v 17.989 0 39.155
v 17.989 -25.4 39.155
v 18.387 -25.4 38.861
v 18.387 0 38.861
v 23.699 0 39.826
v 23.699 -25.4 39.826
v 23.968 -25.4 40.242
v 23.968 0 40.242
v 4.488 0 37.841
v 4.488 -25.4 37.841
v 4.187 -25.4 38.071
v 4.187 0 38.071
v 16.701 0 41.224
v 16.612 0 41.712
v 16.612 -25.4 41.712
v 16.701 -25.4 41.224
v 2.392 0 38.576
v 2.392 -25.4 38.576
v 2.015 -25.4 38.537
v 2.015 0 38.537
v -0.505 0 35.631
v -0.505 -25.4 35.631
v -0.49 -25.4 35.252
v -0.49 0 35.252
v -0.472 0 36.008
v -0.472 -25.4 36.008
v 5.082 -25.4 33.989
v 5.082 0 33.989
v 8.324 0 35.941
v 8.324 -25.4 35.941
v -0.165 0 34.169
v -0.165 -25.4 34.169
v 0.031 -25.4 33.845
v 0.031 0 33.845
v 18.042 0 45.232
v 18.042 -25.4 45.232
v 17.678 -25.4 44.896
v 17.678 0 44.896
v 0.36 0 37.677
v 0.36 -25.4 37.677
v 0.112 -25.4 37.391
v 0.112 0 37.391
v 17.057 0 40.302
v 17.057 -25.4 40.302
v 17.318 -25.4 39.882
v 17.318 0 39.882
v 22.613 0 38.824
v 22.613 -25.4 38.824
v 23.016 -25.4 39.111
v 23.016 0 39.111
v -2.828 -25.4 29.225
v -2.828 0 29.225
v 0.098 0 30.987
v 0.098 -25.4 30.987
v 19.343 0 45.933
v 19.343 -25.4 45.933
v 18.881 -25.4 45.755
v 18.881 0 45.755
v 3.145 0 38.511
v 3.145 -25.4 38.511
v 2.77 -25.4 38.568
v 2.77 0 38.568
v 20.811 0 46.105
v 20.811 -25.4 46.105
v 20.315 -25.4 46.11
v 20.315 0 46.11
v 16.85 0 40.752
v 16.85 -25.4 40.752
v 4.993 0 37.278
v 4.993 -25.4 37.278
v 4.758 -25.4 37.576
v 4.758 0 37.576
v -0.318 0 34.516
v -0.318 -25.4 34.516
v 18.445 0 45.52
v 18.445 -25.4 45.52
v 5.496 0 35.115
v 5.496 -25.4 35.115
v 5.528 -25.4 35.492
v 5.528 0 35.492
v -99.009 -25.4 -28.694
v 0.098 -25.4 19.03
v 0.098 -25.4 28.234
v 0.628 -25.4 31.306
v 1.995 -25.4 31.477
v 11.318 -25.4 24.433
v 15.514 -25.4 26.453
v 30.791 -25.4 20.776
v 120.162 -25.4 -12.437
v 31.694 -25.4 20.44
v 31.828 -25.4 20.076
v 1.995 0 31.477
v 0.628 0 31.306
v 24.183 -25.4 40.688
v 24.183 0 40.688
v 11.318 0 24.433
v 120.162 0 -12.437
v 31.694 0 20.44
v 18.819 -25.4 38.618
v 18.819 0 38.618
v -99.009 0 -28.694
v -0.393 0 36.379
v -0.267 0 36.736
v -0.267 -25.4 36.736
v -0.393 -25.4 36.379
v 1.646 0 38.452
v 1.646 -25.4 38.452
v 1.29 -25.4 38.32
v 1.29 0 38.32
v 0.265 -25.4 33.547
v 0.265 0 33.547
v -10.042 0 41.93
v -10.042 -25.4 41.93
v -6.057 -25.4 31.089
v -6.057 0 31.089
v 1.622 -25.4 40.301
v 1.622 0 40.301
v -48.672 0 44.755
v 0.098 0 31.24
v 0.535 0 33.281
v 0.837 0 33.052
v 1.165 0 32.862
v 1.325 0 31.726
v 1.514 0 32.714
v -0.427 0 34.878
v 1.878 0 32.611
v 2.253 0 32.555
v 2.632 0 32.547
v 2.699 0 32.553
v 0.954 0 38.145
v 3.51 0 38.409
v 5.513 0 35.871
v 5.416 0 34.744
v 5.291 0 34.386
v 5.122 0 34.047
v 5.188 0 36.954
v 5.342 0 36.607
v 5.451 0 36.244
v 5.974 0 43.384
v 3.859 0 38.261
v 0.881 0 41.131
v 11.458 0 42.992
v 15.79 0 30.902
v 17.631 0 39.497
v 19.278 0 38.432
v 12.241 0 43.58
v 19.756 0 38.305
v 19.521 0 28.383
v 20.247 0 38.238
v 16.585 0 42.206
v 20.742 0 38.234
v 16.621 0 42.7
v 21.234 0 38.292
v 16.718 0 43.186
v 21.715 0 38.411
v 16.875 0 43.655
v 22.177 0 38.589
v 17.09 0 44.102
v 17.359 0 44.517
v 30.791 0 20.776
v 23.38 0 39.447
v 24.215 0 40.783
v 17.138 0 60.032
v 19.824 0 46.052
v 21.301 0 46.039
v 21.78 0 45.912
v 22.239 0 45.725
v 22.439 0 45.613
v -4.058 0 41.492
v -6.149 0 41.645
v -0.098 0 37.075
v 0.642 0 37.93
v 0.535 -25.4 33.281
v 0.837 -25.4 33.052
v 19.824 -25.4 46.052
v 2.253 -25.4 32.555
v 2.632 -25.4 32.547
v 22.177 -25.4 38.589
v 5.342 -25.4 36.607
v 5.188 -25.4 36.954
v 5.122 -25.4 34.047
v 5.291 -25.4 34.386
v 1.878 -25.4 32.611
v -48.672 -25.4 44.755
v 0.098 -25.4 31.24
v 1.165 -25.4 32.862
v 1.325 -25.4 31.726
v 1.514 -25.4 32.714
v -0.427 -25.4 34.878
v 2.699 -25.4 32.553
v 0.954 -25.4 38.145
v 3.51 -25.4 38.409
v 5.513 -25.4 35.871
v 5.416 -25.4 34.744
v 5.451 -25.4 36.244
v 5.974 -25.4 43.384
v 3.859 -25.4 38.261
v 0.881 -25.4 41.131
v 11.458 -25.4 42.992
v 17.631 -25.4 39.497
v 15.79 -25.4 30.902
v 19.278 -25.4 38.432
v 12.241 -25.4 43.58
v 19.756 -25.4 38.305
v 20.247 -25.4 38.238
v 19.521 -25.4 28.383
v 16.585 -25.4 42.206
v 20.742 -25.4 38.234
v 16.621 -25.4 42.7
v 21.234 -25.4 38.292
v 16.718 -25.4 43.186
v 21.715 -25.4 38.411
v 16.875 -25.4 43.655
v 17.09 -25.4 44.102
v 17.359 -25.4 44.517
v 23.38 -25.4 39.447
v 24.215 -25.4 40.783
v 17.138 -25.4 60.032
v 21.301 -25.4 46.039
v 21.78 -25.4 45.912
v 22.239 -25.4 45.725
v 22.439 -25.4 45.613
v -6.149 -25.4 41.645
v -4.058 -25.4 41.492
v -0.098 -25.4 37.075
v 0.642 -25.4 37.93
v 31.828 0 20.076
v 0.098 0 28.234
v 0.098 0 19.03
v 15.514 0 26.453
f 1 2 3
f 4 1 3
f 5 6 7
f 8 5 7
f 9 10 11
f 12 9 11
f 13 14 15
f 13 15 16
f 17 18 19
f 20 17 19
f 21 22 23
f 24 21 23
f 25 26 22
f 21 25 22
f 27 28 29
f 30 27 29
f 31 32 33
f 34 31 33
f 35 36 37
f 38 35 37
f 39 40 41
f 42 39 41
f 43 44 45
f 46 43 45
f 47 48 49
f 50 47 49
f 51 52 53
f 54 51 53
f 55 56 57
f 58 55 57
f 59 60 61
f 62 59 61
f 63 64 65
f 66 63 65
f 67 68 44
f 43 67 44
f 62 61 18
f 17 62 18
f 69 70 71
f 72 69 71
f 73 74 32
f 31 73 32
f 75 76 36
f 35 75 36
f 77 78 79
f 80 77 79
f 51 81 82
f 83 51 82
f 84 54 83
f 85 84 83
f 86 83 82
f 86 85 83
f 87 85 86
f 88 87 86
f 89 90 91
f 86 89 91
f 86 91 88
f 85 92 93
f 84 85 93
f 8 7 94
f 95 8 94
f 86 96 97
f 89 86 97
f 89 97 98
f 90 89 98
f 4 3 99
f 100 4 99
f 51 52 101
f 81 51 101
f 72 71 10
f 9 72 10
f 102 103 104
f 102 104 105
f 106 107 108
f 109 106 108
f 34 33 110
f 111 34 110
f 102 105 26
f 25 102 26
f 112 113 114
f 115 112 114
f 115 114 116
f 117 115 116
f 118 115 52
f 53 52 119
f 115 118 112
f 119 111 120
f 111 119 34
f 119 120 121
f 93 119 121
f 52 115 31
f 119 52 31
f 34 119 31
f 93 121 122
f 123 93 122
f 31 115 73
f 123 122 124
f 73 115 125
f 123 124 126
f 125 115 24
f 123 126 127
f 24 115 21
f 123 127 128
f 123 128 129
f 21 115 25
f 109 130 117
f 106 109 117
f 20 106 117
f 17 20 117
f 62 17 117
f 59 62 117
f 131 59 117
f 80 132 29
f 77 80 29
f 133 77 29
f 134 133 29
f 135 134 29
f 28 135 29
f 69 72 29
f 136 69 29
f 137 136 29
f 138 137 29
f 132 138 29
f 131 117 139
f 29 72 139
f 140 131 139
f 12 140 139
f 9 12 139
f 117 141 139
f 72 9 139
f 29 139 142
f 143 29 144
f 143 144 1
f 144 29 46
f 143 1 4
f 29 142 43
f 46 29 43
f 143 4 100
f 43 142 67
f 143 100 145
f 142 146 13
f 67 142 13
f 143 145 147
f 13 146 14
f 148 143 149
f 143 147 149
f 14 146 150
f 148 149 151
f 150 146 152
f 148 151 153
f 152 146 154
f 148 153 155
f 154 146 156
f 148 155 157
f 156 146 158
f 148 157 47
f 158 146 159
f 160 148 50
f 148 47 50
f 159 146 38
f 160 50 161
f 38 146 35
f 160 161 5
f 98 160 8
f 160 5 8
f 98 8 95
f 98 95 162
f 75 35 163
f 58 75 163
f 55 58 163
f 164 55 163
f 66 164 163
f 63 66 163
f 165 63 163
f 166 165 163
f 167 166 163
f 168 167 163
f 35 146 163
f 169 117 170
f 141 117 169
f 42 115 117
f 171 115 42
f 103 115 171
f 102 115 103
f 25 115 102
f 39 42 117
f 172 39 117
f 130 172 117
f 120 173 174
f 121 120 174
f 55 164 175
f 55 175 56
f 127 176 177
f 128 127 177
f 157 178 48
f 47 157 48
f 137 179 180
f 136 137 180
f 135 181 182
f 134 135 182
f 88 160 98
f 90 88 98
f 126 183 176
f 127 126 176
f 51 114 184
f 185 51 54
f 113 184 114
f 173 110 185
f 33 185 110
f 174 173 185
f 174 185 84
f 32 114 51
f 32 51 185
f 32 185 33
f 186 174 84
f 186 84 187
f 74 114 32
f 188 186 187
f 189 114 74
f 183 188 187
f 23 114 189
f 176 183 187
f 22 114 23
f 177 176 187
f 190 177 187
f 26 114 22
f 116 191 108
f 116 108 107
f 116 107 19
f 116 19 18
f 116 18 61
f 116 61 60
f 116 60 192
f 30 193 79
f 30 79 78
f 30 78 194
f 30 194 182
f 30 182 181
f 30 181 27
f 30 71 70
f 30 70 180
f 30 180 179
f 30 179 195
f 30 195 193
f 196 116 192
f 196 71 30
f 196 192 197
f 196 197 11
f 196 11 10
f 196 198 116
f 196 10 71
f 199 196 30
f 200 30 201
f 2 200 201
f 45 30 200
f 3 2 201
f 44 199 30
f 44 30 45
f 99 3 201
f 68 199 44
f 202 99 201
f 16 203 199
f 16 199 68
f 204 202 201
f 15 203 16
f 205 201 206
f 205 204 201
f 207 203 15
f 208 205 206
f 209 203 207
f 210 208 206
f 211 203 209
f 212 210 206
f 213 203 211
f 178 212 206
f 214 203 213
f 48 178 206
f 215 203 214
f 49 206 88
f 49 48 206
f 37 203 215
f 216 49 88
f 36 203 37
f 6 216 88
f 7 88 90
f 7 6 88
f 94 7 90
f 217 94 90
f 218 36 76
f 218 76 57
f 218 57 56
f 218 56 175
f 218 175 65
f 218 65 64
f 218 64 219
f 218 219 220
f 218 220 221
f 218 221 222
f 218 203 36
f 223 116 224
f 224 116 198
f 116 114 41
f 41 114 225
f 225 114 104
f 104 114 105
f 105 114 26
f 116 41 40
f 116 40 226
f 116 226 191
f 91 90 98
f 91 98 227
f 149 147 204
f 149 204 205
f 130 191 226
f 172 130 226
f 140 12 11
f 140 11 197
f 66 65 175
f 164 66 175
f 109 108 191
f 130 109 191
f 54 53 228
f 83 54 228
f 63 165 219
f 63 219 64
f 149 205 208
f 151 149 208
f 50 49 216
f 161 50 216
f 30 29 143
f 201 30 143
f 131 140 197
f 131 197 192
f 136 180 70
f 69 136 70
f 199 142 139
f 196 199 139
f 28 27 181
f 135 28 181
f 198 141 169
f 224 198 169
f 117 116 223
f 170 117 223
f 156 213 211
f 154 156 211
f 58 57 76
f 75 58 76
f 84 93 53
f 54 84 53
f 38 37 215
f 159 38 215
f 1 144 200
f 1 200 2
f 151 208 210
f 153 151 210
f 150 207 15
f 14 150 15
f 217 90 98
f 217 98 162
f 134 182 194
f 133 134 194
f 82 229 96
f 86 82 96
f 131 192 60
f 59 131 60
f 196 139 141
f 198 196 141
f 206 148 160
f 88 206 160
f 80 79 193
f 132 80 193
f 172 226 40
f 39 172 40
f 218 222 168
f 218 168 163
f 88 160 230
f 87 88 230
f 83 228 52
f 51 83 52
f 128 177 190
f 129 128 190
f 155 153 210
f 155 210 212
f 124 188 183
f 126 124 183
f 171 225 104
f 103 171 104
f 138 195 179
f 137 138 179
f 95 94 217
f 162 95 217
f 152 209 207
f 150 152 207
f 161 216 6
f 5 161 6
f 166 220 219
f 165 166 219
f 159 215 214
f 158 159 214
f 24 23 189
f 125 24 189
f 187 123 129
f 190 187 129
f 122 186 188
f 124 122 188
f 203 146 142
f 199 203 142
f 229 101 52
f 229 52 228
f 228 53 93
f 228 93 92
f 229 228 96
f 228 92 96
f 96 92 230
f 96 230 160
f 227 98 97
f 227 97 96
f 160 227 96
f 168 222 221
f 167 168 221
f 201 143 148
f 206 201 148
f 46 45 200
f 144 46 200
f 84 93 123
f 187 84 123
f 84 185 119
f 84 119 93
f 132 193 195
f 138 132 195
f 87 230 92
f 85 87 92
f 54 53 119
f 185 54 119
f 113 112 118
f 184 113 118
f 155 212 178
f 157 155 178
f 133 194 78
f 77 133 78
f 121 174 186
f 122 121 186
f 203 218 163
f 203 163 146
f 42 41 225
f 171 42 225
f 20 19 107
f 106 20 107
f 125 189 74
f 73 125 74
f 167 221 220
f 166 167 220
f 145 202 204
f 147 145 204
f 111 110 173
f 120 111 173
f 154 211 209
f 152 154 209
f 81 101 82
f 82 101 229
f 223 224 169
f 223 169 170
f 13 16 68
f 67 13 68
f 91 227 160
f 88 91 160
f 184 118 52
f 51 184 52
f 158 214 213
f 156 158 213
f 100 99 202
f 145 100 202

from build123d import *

# Parameters (mm, degrees)
F1_DEPTH = 25.4
F3_DEPTH = 25.4


with BuildPart() as f1:
    # F0 (on Front) → F1 (new body)
    with BuildSketch(Plane.XZ):
        Polygon((0.0979326942, 30.9870848271), (0.0979326942, 28.2340252644), (11.3184319648, 24.433113655), (15.5136247142, 26.4532707196), (1.9948919278, 31.4772539108), (0.6282224689, 31.3064199129), align=None)
        Polygon((0.0979326942, 28.2340252644), (0.0979326942, 19.0299838766), (11.3184319648, 24.433113655), align=None)
        Polygon((15.5136247142, 26.4532707196), (11.3184319648, 24.433113655), (120.1618984342, -12.4372951686), (31.6938058464, 20.4402102262), (31.8277254701, 20.0759489089), (30.7910577728, 20.7756995964), align=None)
        Polygon((-99.0087017417, -28.6939181387), (0.0979326942, 19.0299838766), (0.0979326942, 28.2340252644), (-2.8279378914, 29.2251554457), align=None)
    extrude(amount=F1_DEPTH)


with BuildPart() as f1b:
    # F0 (on Front) → F1, piece 2 (new body)
    with BuildSketch(Plane.XZ):
        Polygon((15.7896154423, 30.9016730506), (19.5210021768, 28.3829870343), (30.7910577728, 20.7756995964), (31.6938058464, 20.4402102262), (17.138004303, 60.0319840014), (12.2414315119, 43.5795001686), (11.4579787478, 42.9919101298), (5.9738163836, 43.3836393058), (0.8813833701, 41.13121517), (-4.0579978236, 41.4923949564), (-17.9214570671, 38.8787910342), (1.3251996688, 31.7261324637), (8.3241760731, 35.9408445656), align=None)
        Polygon((-2.8279378914, 29.2251554457), (0.0979326942, 30.9870848271), (0.0979326942, 31.2401335686), (0.6282224689, 31.3064199129), (1.3251996688, 31.7261324637), (-17.9214570671, 38.8787910342), (-4.0579978236, 41.4923949564), (-48.6719347537, 44.7546765208), align=None)
    extrude(amount=F1_DEPTH)

    # F2 (on face) → F3 (cut)
    with BuildSketch(Plane.XZ.offset(25.4)):
        Polygon((2.6318714004, 32.5465527118), (2.6990958674, 32.5534787212), (5.082451947, 33.9887114084), (5.1216370942, 34.0474278013), (5.2908110742, 34.3864762848), (5.4161570241, 34.7440543918), (5.4956981633, 35.1145229018), (5.5281800805, 35.4920393051), (5.5130905166, 35.8706499426), (5.450667443, 36.2443838982), (5.3418953088, 36.6073471643), (5.1884895155, 36.9538155933), (4.9928693642, 37.2783251712), (4.7581199015, 37.575758188), (4.4879432667, 37.8414239474), (4.1866003067, 38.0711327417), (3.8588433799, 38.2612619259), (3.509841409, 38.4088130493), (3.1450983634, 38.5114591424), (2.7703664589, 38.5675814151), (2.3915554415, 38.5762947856), (2.0146393873, 38.5374618389), (1.6455624874, 38.4516949937), (1.2901453052, 38.3203468444), (0.953992982, 38.1454888298), (0.6424068405, 37.9298785652), (0.3603007806, 37.6769163533), (0.1121237831, 37.3905915593), (-0.0982102523, 37.0754196962), (-0.2673842323, 36.7363712126), (-0.3927301821, 36.3787931057), (-0.4722713213, 36.0083245957), (-0.5047532386, 35.6308081924), (-0.4896636747, 35.2521975549), (-0.427240601, 34.8784635993), (-0.3184684668, 34.5155003332), (-0.1650626736, 34.1690319041), (0.0305574777, 33.8445223262), (0.2653069404, 33.5470893094), (0.5354835752, 33.28142355), (0.8368265353, 33.0517147558), (1.164583462, 32.8615855716), (1.513585433, 32.7140344482), (1.8783284785, 32.6113883551), (2.253060383, 32.5552660823), align=None)
        Polygon((24.2146741399, 40.7834451677), (22.439074716, 45.6130748171), (22.2388960862, 45.7253988086), (21.7800252341, 45.9117045677), (21.3014224125, 46.0390294826), (20.8106354738, 46.1053655633), (20.3154044212, 46.1096666502), (19.8235393443, 46.0518649125), (19.3427972491, 45.9328719182), (18.8807597256, 45.754564258), (18.4447133817, 45.51975395), (18.0415349285, 45.2321440932), (17.6775827313, 44.8962704668), (17.3585965335, 44.5174299985), (17.0896069381, 44.1015972288), (16.8748560716, 43.6553300889), (16.7177306835, 43.1856664782), (16.620708735, 42.7000132724), (16.5853203203, 42.2060295126), (16.6121235357, 41.7115056179), (16.7006956786, 41.2242405255), (16.8496399133, 40.7519186969), (17.0566073002, 40.3019889296), (17.3183338402, 39.8815468847), (17.6306919492, 39.4972231845), (17.9887555533, 39.1550788433), (18.3868777755, 38.8605096817), (18.8187799907, 38.6181612314), (19.2776508428, 38.4318554723), (19.7562536644, 38.3045305574), (20.2470406031, 38.2381944767), (20.7422716557, 38.2338933898), (21.2341367326, 38.2916951275), (21.7148788278, 38.4106881218), (22.1769163513, 38.588995782), (22.6129626952, 38.82380609), (23.0161411484, 39.1114159468), (23.3800933456, 39.4472895732), (23.6990795434, 39.8261300415), (23.9680691388, 40.2419628112), (24.1828200053, 40.6882299511), align=None)
        Polygon((-10.0421942622, 41.9299742211), (-6.0566326975, 31.0892485241), (1.6222022931, 40.3010312417), (-6.1486050589, 41.6452653353), align=None)
    extrude(amount=-F3_DEPTH, mode=Mode.SUBTRACT)


solid = Compound([f1.part, f1b.part])
